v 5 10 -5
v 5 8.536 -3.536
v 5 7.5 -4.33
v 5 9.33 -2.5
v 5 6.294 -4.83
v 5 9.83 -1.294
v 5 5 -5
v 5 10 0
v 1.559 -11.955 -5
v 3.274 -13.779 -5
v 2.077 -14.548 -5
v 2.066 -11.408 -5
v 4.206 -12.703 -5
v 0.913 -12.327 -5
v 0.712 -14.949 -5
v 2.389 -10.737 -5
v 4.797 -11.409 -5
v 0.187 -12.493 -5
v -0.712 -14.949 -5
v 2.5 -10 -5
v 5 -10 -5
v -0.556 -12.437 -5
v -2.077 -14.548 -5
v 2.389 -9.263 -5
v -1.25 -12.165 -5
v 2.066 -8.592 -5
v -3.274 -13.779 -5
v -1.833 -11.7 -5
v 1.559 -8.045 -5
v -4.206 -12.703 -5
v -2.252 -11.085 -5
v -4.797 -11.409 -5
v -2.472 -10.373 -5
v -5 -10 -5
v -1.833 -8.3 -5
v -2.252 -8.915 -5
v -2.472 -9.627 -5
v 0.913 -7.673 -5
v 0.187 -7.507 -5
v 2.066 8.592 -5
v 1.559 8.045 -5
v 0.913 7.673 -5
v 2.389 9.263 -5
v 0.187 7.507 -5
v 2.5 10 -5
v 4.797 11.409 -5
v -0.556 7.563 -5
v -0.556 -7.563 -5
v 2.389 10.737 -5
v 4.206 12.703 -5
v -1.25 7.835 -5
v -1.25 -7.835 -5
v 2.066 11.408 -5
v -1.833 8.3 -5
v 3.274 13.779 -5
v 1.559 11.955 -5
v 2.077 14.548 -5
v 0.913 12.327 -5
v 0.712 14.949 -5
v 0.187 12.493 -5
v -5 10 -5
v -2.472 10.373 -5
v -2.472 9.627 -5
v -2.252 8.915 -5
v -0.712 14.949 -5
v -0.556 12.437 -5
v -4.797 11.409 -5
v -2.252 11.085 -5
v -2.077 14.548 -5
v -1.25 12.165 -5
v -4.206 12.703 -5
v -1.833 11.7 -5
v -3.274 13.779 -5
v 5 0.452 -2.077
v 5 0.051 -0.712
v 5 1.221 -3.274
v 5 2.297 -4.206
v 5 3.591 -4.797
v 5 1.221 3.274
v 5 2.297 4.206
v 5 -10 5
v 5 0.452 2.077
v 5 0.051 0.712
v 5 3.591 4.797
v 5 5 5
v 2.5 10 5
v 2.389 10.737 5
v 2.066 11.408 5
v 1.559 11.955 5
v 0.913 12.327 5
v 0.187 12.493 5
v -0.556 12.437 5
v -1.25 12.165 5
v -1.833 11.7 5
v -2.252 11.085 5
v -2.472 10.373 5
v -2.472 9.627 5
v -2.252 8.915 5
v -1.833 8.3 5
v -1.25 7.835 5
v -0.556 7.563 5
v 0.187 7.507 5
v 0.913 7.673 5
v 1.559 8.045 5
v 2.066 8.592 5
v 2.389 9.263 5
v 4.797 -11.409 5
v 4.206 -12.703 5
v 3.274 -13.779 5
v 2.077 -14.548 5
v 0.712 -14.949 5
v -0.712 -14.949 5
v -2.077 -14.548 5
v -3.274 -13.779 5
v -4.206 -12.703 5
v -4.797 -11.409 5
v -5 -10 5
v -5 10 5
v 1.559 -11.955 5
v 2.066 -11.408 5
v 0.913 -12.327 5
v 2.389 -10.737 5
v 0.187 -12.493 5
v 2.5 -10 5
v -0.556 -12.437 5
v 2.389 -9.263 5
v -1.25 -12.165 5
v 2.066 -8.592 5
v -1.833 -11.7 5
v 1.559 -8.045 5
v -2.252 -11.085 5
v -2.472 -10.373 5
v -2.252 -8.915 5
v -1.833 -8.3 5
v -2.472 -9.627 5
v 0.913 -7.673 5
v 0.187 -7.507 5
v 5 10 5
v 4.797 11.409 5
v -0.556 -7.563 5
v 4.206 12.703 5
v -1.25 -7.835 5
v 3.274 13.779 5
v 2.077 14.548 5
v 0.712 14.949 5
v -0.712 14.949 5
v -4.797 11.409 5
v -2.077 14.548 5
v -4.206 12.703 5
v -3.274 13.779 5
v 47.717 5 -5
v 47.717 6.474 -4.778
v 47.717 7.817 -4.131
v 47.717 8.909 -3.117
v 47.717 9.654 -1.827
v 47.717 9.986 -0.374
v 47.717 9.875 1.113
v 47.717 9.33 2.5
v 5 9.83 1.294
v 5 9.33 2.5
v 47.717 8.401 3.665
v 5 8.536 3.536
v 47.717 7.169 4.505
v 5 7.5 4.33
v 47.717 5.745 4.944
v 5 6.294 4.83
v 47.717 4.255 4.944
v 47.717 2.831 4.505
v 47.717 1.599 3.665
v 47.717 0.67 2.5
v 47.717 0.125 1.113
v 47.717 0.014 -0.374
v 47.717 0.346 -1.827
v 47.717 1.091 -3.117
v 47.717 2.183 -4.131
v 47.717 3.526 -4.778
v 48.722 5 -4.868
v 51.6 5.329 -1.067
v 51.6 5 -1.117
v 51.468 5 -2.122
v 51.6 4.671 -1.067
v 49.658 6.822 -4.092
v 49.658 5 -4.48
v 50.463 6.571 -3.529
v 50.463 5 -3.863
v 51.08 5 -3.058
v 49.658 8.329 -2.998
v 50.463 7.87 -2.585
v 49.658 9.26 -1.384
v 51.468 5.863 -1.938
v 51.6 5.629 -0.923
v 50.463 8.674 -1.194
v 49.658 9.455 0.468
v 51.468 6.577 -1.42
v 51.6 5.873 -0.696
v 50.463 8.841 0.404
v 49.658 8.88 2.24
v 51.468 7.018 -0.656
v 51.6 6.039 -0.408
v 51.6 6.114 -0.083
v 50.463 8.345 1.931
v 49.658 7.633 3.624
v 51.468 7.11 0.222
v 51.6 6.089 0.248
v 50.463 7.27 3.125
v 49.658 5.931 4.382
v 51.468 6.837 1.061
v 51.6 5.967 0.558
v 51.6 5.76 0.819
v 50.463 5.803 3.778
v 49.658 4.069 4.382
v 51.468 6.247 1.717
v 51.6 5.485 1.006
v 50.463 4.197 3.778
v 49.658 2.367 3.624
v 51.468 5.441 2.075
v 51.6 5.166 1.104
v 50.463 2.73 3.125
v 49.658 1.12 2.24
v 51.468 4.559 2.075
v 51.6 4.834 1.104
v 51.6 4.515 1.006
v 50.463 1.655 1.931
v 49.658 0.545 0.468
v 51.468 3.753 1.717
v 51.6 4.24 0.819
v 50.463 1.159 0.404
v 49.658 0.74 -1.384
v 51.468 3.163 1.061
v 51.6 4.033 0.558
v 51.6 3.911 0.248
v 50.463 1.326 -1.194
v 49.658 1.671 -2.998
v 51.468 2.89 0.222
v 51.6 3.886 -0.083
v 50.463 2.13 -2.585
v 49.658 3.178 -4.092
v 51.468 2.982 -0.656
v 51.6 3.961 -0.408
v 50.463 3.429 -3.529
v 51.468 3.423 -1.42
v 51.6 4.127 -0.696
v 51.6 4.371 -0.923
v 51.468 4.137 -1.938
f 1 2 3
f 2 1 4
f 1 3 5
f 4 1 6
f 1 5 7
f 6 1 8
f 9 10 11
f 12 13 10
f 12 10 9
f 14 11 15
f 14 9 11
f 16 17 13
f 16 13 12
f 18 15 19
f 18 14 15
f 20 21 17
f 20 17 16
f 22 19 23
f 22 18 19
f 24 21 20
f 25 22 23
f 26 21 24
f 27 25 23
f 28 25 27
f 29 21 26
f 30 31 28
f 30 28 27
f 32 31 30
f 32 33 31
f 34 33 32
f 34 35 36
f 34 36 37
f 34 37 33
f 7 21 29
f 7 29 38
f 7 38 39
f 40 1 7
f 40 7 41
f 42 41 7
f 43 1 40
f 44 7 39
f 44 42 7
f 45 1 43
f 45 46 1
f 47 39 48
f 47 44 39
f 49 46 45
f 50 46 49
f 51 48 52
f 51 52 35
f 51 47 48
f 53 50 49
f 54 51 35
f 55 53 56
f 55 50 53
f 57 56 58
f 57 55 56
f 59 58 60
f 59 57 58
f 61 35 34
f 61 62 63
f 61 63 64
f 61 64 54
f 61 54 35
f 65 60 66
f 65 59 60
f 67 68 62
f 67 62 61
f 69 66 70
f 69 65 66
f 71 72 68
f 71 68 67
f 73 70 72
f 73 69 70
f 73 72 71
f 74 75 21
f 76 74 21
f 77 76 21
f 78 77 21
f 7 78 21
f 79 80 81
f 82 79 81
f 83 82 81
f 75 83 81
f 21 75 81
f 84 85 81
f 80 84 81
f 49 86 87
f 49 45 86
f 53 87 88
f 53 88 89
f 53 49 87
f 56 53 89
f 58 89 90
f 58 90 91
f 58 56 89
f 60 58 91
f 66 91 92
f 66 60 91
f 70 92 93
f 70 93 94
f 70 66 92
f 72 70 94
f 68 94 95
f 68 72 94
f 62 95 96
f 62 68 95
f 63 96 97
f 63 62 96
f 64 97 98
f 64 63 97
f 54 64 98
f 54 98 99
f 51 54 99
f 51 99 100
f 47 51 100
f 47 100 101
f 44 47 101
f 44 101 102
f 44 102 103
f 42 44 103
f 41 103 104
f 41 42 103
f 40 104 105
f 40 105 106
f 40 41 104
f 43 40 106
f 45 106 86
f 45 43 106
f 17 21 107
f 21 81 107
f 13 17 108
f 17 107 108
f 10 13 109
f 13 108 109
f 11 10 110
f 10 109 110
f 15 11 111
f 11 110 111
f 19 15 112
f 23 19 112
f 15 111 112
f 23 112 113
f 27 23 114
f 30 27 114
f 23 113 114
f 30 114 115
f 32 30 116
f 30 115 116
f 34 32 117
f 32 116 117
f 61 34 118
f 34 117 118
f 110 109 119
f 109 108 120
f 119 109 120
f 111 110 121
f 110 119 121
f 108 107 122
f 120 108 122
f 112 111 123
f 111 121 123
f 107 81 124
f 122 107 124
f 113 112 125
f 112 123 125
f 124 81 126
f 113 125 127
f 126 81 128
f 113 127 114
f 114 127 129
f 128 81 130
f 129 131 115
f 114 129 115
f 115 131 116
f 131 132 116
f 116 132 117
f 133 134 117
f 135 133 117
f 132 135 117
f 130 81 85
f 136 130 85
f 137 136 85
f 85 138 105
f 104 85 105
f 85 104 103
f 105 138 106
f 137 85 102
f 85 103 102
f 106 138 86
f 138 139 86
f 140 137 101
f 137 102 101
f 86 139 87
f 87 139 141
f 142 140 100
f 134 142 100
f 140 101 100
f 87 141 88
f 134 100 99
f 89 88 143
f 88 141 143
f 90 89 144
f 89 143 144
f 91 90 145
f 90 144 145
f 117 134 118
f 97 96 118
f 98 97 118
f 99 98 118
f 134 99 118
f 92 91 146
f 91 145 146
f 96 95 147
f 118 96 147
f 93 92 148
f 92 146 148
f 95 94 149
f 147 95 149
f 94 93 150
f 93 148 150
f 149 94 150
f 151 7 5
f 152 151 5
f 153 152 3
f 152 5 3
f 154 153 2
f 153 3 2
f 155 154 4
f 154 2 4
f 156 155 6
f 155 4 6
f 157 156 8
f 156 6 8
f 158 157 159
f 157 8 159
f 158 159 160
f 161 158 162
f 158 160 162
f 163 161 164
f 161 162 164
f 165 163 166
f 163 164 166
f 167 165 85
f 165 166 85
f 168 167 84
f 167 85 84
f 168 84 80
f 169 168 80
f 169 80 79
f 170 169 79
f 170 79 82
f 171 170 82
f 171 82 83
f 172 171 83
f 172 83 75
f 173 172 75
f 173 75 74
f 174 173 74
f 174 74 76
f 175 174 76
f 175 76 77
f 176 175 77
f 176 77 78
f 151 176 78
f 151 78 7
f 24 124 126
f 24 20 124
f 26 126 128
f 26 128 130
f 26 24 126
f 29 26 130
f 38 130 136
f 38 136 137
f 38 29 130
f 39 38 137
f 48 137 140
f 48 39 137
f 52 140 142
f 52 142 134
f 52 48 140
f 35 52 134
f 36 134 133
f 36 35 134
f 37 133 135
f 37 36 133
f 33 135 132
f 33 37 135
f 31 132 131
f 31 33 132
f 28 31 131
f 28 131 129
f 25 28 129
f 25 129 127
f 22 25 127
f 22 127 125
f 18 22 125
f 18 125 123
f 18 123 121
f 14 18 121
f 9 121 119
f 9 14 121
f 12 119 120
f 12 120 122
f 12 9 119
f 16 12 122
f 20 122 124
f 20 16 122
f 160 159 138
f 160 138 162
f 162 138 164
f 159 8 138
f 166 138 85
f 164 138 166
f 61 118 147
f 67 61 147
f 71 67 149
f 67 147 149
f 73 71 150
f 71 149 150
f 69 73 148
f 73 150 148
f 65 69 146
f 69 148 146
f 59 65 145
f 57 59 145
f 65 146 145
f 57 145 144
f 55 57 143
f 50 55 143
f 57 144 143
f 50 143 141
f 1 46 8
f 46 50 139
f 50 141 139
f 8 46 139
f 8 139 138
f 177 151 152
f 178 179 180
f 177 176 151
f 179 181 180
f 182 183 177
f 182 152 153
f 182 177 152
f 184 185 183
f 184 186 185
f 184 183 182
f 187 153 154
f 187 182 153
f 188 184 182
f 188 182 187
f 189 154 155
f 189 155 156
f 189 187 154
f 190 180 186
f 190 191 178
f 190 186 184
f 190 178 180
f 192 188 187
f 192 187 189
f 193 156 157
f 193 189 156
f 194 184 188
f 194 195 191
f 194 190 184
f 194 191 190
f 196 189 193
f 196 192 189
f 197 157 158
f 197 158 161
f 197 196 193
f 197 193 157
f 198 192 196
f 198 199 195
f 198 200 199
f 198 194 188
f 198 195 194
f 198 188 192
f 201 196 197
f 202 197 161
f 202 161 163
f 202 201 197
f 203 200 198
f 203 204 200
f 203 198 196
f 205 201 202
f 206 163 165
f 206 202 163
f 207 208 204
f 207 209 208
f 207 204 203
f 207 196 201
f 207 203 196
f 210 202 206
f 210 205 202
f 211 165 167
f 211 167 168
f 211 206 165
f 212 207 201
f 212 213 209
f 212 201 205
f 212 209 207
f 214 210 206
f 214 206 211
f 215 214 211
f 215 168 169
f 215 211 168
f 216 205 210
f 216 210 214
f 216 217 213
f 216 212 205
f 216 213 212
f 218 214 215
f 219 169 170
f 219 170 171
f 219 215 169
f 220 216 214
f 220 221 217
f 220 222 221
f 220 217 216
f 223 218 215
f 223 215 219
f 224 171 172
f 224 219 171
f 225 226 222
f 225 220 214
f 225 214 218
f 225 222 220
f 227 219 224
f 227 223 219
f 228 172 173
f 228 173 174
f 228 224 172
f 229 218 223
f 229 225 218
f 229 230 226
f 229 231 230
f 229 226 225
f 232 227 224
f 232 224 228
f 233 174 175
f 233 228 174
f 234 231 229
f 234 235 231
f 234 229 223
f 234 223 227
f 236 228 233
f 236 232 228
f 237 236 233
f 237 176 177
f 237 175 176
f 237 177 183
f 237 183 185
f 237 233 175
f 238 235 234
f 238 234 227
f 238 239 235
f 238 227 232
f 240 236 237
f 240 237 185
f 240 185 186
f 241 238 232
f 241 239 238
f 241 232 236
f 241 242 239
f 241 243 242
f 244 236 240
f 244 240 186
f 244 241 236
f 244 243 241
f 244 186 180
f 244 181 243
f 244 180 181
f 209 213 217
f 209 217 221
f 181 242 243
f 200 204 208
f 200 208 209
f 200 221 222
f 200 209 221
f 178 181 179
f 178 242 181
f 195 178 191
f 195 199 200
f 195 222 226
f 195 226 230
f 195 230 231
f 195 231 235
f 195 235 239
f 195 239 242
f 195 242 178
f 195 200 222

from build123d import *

# Parameters (mm, degrees)
ESQUISSE1_R        = 2.5
BOSS_EXTRU_1_DEPTH = 5
ESQUISSE2_R        = 5
BOSS_EXTRU_2_DEPTH = 46.6
CONG_1_R           = 3.883333333


with BuildPart() as part:
    # Esquisse1 → Boss.-Extru.1 (new, symmetric)
    with BuildSketch(Plane.XY):
        with BuildLine():
            Line((5, 10), (5, -10))
            ThreePointArc((5, -10), (0, -15), (-5, -10))
            Line((-5, -10), (-5, 10))
            ThreePointArc((-5, 10), (0, 15), (5, 10))
        make_face()
        with Locations((0, 10)):
            Circle(ESQUISSE1_R, mode=Mode.SUBTRACT)
        with Locations((0, -10)):
            Circle(ESQUISSE1_R, mode=Mode.SUBTRACT)
    extrude(amount=BOSS_EXTRU_1_DEPTH, both=True)

    # Esquisse2 → Boss.-Extru.2 (add)
    with BuildSketch(Plane(origin=(5, 0, 0), x_dir=(0, 0, -1), z_dir=(1, 0, 0))):
        with Locations((0, 5)):
            Circle(ESQUISSE2_R)
    extrude(amount=BOSS_EXTRU_2_DEPTH)

    # Congé1
    cong_1_edges = [part.edges().sort_by_distance(p)[0] for p in [
        (51.6, 5, 5),
    ]]
    fillet(cong_1_edges, radius=CONG_1_R)


solid = part.part
